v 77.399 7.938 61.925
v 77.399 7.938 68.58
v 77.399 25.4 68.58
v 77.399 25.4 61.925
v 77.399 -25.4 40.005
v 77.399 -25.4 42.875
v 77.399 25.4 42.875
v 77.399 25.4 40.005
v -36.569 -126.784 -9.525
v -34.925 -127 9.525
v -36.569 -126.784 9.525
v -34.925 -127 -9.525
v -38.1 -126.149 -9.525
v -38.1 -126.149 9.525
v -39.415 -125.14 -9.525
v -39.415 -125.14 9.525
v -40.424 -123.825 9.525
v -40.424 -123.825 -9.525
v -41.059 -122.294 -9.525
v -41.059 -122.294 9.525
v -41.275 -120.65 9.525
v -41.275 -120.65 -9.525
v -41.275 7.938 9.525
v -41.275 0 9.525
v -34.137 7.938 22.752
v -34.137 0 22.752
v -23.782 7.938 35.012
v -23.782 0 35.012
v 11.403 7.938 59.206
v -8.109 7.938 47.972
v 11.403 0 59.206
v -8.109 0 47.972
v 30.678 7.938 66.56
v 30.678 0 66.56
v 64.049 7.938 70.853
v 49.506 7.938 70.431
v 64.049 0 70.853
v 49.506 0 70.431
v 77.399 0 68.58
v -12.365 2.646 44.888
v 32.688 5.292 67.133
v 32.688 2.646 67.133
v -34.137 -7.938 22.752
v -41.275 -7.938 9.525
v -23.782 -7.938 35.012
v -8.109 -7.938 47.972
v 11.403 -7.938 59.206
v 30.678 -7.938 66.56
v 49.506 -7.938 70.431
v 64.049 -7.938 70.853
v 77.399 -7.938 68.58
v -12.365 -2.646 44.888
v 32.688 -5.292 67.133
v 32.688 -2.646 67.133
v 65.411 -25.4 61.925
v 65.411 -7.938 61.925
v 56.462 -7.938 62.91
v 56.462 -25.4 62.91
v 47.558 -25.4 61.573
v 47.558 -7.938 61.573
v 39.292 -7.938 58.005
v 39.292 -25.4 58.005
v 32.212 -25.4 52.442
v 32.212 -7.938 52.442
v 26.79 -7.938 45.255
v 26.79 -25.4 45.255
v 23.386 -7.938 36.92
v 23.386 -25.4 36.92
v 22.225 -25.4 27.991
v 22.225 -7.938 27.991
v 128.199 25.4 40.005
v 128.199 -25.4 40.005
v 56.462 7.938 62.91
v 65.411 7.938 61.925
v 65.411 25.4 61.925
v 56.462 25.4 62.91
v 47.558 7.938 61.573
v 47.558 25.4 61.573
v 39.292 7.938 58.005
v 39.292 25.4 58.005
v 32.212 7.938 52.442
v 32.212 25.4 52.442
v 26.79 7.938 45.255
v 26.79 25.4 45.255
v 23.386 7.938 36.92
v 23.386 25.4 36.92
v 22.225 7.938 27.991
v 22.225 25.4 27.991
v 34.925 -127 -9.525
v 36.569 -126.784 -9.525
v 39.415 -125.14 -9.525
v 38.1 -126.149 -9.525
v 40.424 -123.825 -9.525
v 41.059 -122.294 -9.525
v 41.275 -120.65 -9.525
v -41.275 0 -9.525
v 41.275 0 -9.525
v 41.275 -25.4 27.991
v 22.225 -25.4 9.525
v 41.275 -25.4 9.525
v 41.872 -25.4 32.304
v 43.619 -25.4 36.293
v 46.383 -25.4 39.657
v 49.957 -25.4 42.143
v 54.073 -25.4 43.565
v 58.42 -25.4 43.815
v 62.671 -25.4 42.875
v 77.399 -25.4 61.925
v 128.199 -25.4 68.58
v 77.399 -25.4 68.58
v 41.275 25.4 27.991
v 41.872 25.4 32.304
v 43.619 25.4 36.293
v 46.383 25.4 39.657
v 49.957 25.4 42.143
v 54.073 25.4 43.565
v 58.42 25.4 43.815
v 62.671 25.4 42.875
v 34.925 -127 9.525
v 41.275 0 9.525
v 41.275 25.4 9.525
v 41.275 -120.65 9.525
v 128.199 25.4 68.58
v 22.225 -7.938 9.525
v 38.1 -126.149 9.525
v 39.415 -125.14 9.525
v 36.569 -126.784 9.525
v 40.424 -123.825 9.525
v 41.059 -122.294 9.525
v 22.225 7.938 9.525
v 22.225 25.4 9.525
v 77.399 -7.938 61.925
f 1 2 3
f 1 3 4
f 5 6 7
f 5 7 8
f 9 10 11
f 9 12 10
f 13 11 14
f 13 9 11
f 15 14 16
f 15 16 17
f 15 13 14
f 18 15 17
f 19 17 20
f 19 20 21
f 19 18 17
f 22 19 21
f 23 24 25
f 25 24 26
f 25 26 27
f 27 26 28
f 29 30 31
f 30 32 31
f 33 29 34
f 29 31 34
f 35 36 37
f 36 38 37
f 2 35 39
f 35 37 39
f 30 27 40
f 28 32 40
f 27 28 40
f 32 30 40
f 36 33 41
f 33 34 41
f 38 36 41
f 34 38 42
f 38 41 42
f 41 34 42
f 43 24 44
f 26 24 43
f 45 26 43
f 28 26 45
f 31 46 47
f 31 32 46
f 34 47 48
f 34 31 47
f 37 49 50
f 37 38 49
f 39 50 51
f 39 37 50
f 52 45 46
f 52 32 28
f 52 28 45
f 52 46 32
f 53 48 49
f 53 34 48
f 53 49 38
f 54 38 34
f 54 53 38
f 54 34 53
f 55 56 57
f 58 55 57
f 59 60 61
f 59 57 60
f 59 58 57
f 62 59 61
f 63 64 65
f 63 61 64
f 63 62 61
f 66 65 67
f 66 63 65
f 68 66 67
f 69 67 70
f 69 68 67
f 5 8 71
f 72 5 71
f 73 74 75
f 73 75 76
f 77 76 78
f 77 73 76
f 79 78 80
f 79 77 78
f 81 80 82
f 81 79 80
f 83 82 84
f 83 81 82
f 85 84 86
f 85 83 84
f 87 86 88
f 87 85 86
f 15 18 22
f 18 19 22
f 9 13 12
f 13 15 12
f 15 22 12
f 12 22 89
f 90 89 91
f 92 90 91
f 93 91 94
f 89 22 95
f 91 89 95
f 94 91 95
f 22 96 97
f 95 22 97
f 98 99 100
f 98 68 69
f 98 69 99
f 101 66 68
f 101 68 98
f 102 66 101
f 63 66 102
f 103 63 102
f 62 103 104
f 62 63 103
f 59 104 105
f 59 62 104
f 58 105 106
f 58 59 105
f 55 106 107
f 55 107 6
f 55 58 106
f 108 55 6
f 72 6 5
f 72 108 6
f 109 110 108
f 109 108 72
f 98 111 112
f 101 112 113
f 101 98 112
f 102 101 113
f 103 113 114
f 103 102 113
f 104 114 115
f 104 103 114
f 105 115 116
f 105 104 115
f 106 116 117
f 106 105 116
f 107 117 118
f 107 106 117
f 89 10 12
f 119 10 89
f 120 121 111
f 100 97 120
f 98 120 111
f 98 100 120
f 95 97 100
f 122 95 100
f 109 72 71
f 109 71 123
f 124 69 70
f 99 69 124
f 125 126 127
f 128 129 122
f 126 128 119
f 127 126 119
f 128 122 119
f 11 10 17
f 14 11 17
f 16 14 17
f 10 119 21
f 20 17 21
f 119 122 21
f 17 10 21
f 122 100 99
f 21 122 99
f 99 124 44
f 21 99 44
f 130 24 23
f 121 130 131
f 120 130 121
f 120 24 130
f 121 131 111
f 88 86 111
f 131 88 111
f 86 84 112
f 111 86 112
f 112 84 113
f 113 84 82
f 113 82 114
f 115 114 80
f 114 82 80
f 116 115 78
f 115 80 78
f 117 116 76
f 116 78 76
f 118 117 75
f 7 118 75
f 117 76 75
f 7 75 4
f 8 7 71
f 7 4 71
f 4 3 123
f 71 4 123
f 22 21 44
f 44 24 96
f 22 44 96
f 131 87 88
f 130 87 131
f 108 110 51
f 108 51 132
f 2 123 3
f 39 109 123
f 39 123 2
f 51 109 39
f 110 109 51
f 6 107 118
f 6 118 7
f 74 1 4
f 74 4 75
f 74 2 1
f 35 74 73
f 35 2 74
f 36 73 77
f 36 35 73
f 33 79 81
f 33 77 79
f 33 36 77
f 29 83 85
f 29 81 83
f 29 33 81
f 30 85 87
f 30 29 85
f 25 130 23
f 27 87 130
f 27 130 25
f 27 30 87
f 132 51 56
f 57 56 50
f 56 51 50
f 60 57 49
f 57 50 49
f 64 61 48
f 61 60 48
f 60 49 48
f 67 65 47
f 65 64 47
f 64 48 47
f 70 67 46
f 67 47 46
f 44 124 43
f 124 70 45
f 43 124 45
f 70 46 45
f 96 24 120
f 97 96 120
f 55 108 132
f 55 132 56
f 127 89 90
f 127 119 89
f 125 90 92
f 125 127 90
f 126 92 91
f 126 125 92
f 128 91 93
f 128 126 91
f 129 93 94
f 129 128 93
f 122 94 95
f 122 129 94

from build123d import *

# Parameters (mm, degrees)
F1_DEPTH = 127
F2_DEPTH = 25.4
F3_DEPTH = 7.9375
F4_R     = 6.35


with BuildPart() as f1:
    # F0 (on Front) → F1 (new body)
    with BuildSketch(Plane.XZ):
        Polygon((-41.275, 9.525), (-41.275, -9.525), (41.275, -9.525), (41.275, 9.525), (22.225, 9.525), align=None)
    extrude(amount=F1_DEPTH)

    # F0 (on Front) → F2 (join, symmetric)
    with BuildSketch(Plane.XZ):
        with BuildLine():
            Line((22.225, 9.525), (41.275, 9.525))
            Line((41.275, 9.525), (41.275, 27.991311))
            ThreePointArc((41.275, 27.991311), (48.084572, 41.023334), (62.671364, 42.8752))
            Line((62.671364, 42.8752), (77.398849, 42.8752))
            Line((77.398849, 42.8752), (77.398849, 61.9252))
            Line((77.398849, 61.9252), (65.411161, 61.9252))
            ThreePointArc((65.411161, 61.9252), (35.571833, 55.45289), (22.225, 27.991311))
            Line((22.225, 27.991311), (22.225, 9.525))
        make_face()
        Polygon((128.198849, 68.58), (77.398849, 68.58), (77.398849, 61.9252), (77.398849, 42.8752), (77.398849, 40.005), (128.198849, 40.005), align=None)
    extrude(amount=F2_DEPTH, both=True)

    # F0 (on Front) → F3 (join, symmetric)
    with BuildSketch(Plane.XZ):
        with BuildLine():
            add(Edge.make_bspline(
                [(-41.275, 9.525), (-25.932714, 48.888751), (38.354626, 80.090507), (77.398849, 68.58)],
                knots=[0, 0, 0, 0, 132.555556, 132.555556, 132.555556, 132.555556], degree=3))
            Line((-41.275, 9.525), (22.225, 9.525))
            Line((22.225, 9.525), (22.225, 27.991311))
            ThreePointArc((22.225, 27.991311), (35.571833, 55.45289), (65.411161, 61.9252))
            Line((65.411161, 61.9252), (77.398849, 61.9252))
            Line((77.398849, 61.9252), (77.398849, 68.58))
        make_face()
    extrude(amount=F3_DEPTH, both=True)

    # F4
    f4_edges = [f1.edges().sort_by_distance(p)[0] for p in [
        (-41.275, -127, 0),
        (41.275, -127, 0),
    ]]
    fillet(f4_edges, radius=F4_R)


solid = f1.part
